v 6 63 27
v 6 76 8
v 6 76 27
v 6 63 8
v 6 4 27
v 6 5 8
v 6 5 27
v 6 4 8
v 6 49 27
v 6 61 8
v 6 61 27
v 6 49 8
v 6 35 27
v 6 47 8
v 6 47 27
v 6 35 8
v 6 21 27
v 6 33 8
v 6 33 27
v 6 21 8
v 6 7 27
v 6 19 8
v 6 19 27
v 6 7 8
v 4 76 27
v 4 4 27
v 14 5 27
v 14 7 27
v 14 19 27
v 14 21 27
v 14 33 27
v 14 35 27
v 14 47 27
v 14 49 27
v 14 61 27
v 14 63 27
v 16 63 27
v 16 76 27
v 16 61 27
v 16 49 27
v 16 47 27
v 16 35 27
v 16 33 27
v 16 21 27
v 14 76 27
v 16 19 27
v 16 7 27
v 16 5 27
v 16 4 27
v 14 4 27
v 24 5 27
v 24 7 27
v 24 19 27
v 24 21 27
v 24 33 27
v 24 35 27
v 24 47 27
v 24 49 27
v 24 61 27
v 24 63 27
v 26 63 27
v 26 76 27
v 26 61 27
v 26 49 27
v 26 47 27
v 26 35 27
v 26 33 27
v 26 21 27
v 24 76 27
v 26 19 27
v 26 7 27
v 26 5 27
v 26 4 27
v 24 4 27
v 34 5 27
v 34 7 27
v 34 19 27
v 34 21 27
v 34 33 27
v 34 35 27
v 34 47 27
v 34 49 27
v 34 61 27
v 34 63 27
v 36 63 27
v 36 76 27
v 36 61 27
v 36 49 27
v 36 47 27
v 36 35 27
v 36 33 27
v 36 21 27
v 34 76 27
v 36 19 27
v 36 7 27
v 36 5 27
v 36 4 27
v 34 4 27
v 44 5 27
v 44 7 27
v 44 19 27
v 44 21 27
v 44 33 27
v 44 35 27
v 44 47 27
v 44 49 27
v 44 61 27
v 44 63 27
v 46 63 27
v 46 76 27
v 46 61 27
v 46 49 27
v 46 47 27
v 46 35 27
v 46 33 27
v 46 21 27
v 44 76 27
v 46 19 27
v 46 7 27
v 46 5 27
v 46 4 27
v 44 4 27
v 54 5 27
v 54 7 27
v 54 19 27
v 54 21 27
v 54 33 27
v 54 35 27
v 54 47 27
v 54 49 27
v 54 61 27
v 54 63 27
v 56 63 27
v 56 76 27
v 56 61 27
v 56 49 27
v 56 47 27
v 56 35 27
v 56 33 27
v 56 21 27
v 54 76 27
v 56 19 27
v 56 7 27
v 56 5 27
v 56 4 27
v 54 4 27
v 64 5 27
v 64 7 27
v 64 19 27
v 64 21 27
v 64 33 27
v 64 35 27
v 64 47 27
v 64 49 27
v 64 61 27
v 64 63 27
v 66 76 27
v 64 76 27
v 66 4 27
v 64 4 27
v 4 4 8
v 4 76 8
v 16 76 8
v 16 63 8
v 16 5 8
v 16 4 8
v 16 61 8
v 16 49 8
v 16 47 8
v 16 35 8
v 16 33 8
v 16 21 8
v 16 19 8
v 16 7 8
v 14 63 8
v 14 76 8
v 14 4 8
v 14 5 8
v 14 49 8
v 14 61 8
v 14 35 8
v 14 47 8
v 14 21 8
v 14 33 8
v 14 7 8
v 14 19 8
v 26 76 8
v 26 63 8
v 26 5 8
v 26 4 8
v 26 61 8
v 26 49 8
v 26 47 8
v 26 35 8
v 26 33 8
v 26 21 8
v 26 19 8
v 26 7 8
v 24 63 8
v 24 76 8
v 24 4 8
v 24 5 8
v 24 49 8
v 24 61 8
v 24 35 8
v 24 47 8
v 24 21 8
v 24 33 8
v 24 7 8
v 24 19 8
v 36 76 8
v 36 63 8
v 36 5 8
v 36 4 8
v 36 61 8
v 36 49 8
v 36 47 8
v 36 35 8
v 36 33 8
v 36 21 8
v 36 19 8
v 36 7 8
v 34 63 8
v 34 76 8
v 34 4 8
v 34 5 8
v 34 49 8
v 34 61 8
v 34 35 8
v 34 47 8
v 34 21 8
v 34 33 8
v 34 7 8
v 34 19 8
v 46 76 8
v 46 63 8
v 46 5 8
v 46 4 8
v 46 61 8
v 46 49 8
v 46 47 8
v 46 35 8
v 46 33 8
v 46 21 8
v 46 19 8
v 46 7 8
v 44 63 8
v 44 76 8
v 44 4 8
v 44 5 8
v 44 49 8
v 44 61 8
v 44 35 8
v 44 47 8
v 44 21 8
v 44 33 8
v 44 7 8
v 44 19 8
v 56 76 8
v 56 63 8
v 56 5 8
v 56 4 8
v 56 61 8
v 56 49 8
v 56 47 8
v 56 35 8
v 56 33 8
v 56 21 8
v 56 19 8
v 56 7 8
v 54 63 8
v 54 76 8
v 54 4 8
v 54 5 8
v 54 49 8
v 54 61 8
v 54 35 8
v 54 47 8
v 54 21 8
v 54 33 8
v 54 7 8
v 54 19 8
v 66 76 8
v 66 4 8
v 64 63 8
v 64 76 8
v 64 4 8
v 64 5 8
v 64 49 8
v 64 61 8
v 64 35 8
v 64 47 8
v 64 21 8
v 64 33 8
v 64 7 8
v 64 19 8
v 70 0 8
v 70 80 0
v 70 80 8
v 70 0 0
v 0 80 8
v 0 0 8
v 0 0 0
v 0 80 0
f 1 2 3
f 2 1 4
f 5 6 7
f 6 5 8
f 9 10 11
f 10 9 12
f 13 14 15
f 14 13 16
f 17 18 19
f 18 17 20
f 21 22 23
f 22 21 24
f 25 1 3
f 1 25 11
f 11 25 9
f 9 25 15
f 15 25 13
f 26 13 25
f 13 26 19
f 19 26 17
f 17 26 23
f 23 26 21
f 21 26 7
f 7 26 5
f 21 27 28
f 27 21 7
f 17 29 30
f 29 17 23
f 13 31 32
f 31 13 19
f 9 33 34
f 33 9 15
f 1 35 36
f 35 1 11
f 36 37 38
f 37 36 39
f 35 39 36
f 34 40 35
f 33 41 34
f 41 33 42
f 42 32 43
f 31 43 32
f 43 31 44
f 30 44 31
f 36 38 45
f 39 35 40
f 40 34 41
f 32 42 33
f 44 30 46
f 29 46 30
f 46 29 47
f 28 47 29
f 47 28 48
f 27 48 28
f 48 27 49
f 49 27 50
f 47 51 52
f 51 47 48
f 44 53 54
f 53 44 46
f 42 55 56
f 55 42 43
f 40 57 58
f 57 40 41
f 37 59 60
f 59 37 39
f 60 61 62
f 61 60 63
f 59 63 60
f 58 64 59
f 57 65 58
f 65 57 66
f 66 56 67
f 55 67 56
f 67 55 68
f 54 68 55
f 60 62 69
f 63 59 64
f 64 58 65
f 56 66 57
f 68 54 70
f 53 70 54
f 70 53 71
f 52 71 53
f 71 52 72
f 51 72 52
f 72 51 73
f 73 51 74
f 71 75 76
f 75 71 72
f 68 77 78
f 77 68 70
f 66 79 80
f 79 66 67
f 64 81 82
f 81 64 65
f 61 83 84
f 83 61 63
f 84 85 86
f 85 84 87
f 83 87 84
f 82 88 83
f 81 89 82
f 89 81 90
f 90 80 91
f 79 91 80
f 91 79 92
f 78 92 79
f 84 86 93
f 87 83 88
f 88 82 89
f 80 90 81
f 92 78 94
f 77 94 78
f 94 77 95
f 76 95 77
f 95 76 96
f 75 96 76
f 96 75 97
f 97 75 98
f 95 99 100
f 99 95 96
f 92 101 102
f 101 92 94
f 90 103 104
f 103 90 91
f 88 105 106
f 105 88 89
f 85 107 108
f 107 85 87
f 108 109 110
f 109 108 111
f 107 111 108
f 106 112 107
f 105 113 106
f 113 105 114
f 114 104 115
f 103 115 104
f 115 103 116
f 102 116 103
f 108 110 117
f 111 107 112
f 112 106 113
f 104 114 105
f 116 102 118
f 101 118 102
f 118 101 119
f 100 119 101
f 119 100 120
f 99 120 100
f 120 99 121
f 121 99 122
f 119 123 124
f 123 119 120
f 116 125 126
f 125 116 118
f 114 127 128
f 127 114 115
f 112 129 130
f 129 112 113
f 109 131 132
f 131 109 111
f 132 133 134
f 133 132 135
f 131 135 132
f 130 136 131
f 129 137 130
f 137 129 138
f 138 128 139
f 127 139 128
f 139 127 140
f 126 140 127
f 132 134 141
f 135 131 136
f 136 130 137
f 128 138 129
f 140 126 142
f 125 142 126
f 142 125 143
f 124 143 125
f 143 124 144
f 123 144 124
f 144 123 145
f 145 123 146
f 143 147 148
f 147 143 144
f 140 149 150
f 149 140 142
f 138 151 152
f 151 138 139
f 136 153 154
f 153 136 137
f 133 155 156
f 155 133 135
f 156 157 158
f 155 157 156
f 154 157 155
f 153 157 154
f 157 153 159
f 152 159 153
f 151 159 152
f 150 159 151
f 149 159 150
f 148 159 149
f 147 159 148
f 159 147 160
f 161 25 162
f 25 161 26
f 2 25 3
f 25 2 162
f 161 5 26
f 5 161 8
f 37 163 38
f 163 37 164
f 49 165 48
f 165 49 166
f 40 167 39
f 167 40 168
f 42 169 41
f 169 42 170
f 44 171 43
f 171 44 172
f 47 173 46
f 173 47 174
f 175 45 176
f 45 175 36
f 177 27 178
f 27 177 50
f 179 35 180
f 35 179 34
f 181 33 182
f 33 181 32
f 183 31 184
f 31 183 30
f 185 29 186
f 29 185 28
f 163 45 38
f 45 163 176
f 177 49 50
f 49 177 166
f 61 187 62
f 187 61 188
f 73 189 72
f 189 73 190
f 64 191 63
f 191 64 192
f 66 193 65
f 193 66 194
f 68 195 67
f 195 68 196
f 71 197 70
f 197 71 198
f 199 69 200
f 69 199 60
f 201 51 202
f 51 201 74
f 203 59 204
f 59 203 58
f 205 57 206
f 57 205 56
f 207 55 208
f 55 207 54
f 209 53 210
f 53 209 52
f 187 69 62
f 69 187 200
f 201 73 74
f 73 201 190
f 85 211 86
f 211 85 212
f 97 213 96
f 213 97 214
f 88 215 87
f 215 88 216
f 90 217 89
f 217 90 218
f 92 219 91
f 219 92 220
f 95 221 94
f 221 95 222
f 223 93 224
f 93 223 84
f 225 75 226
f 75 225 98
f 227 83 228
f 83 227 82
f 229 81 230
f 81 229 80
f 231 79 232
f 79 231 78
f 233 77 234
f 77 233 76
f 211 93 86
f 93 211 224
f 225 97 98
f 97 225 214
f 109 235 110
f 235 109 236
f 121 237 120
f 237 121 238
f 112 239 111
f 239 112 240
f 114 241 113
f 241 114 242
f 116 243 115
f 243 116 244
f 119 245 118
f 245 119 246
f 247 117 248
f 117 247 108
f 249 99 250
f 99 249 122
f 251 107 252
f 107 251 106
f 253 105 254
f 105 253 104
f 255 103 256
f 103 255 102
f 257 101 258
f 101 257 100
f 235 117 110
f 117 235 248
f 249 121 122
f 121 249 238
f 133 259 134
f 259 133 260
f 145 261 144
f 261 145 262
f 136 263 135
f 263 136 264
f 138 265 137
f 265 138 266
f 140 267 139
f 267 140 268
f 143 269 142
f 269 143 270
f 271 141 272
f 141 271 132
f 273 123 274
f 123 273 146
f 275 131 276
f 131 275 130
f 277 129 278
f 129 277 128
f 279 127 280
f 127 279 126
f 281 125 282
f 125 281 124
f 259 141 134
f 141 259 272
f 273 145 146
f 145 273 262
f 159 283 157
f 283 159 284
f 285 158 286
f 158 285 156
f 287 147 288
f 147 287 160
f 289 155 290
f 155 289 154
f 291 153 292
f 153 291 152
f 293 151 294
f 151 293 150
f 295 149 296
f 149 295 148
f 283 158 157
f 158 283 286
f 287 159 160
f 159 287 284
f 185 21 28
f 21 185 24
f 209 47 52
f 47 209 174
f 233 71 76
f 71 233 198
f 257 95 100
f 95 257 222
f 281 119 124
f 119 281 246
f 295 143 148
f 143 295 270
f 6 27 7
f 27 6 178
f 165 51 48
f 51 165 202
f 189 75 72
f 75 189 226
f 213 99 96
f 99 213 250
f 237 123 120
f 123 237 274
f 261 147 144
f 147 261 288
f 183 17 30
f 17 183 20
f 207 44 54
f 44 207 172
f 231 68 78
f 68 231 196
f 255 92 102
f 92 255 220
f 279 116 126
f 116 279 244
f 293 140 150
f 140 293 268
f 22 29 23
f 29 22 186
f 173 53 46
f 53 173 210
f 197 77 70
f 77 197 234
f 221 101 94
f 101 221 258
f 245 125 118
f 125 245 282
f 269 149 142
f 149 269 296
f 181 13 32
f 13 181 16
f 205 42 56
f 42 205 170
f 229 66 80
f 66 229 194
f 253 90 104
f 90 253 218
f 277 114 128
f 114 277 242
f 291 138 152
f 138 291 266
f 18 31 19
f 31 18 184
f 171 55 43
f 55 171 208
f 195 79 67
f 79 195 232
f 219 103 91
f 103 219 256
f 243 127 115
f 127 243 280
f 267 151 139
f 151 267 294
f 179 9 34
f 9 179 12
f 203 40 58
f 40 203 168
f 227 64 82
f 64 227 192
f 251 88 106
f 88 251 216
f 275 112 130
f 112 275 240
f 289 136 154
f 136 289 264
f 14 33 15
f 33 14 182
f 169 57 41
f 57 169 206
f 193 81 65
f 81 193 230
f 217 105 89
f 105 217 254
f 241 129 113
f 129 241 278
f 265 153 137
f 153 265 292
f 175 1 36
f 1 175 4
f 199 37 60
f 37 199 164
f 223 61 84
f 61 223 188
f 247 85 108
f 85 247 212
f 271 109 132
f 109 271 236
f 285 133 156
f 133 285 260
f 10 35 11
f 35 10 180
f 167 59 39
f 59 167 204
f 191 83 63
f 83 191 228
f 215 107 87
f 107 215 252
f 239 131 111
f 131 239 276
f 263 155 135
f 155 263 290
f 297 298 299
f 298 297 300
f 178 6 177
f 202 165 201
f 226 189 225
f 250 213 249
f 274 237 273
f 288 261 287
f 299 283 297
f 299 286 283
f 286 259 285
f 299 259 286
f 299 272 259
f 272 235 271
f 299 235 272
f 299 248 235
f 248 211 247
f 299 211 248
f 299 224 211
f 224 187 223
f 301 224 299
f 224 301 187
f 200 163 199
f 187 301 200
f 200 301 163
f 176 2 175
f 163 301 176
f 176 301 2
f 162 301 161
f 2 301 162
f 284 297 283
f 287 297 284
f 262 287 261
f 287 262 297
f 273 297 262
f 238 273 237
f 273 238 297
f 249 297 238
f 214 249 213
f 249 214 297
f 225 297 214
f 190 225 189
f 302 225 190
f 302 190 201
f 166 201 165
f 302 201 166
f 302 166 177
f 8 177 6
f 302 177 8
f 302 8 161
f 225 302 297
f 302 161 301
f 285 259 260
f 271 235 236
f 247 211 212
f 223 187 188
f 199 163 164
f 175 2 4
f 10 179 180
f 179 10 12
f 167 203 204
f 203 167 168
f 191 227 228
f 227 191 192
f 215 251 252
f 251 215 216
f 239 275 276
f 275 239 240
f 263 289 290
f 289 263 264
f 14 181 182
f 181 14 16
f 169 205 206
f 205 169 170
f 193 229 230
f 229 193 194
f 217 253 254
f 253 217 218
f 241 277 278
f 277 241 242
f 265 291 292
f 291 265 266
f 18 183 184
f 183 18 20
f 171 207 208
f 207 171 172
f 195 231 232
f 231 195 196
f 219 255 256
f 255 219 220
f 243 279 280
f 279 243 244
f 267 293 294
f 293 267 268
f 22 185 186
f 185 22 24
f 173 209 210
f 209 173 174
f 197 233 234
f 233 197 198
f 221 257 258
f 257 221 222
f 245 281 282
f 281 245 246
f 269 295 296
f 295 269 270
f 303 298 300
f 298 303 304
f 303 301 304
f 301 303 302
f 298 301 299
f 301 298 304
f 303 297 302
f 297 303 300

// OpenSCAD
$fn = 32;

// ----------------------------------------------------------------------
// Heatsink: cross fin block
// ----------------------------------------------------------------------

// --- parameters (mm) ---
base_l = 70;              // base length, X
base_w = 80;              // base width, Y
base_t = 8;               // base plate thickness
fin_h = 20;               // fin height above the base
fin_t = 2;                // fin thickness
edge = 4;                 // margin from the base ends
pitch = 10;               // fin pitch
rib_pitch = 14;           // cross rib pitch
fit_tol = 0.1;            // tolerance for press fits, mm
free_tol = 0.3;           // tolerance for clearance fits, mm

n_fins = floor((base_l - 2 * edge - fin_t) / pitch) + 1;  // fin count
total_h = base_t + fin_h - 1;  // overall height
n_ribs = floor((base_w - 2 * edge) / rib_pitch);  // rib count

union() {
  cube([base_l, base_w, base_t]);
  for (i = [0 : n_fins - 1])
    translate([edge + i * pitch, edge, base_t - 1])
      cube([fin_t, base_w - 2 * edge, fin_h]);
  for (i = [0 : n_ribs - 1])
    translate([edge, edge + 1 + i * rib_pitch, base_t - 1])
      cube([base_l - 2 * edge, fin_t, fin_h]);
}
